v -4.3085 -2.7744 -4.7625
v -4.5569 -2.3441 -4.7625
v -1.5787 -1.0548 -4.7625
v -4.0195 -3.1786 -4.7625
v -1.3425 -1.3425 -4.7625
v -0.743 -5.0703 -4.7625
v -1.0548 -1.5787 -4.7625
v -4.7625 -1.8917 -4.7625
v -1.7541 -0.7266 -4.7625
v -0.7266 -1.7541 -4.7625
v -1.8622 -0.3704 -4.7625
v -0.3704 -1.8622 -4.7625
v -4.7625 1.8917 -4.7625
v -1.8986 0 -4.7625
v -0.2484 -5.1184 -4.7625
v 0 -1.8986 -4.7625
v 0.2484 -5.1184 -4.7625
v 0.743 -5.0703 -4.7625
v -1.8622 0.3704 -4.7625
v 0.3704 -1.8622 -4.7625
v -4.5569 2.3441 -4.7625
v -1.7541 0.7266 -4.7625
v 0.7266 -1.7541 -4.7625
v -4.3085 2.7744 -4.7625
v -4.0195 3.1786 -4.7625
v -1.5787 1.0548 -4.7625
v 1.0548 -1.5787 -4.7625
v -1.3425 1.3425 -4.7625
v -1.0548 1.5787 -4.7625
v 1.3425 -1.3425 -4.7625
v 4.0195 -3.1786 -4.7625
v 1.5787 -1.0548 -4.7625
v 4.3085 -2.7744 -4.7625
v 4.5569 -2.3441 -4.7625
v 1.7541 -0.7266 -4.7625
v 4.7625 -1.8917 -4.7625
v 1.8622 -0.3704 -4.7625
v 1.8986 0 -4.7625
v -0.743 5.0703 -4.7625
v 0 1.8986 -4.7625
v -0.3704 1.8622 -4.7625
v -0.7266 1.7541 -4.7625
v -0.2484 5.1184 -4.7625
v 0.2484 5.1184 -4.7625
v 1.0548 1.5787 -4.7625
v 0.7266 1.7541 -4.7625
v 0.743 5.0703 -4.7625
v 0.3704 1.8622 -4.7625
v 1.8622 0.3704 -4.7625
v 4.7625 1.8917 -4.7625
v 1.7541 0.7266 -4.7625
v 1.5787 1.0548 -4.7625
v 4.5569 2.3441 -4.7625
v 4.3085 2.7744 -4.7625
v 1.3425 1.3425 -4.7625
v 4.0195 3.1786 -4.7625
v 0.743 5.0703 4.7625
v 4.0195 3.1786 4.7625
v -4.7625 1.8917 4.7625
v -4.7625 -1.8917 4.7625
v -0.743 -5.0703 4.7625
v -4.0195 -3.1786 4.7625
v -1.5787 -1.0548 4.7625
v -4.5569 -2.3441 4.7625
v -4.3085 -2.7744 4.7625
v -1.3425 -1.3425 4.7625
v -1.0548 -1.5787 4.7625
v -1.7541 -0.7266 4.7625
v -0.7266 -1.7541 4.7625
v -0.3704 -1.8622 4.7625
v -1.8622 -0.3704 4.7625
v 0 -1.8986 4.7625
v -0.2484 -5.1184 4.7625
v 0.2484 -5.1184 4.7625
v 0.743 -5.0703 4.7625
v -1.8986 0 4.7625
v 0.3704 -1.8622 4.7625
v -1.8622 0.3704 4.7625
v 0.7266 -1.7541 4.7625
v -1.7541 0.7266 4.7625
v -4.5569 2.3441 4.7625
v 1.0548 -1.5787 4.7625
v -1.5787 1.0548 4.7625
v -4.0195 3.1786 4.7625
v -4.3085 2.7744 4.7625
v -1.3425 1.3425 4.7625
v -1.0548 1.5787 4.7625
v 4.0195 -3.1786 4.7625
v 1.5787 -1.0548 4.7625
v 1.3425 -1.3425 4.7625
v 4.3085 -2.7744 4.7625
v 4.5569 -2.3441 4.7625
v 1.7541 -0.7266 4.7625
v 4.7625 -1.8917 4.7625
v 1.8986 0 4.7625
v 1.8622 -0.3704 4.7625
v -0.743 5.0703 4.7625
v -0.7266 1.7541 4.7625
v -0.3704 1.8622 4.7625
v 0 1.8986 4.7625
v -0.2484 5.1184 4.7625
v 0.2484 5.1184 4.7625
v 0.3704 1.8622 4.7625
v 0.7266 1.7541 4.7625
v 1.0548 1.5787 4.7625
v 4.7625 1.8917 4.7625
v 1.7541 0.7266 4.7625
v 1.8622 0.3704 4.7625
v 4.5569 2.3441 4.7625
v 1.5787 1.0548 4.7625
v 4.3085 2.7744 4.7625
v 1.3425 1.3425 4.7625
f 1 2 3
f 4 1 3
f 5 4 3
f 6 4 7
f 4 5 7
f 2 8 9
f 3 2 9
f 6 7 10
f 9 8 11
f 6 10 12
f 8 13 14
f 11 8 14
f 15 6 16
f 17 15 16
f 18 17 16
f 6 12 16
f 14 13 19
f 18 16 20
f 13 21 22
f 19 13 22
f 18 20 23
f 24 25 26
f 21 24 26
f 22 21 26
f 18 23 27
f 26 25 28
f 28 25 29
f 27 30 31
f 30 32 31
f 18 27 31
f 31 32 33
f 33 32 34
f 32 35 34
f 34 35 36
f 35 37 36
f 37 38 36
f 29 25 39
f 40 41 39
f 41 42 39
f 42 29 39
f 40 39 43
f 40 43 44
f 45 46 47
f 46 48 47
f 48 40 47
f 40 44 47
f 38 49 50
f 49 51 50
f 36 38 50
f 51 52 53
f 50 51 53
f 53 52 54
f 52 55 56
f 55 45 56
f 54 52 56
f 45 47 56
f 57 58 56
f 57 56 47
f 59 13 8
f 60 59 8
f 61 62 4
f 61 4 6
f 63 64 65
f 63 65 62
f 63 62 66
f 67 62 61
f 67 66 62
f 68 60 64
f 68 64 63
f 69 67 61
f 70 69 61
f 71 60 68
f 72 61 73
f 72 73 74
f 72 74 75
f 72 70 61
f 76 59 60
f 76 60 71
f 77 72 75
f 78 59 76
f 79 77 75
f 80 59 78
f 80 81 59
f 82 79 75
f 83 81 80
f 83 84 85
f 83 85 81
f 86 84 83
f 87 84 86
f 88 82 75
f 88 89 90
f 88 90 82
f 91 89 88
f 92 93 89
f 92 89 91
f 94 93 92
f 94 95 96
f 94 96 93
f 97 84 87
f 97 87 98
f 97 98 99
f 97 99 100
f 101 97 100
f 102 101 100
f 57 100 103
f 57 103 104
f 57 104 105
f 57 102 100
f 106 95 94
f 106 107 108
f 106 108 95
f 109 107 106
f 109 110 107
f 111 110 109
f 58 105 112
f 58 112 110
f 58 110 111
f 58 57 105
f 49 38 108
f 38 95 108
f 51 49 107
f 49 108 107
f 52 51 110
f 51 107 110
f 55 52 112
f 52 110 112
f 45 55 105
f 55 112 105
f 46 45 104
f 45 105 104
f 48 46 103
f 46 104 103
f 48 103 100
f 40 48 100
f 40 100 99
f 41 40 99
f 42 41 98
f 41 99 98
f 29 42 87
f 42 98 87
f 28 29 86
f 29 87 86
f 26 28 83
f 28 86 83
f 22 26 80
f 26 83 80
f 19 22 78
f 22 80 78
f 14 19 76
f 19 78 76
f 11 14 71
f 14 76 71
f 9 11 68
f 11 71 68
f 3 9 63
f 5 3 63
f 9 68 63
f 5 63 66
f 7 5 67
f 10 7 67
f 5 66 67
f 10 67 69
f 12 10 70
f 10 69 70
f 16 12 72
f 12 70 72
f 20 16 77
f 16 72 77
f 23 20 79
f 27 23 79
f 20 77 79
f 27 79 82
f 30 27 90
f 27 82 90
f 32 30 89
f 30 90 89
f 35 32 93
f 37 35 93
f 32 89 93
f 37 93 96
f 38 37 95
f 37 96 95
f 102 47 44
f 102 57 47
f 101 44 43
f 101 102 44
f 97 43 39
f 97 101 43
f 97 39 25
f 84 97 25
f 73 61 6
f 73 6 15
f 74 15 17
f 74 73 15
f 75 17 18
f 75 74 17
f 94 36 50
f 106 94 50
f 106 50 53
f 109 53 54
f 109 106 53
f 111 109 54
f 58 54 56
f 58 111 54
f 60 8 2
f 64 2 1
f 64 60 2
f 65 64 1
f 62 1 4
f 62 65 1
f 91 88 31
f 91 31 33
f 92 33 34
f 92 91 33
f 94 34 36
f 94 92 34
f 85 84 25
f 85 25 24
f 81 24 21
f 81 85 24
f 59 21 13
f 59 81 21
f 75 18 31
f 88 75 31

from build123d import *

# Parameters (mm, degrees)
SKETCH1_R               = 4.7625
BASIC_ROD_DEPTH         = 4.7625
BASIC_ROD_DEPTH_BACK    = 4.7625
THEX_DEPTH              = 4.7625
SKETCH2_R               = 1.89865
INTERNAL_CUT_DEPTH      = 5.7625
INTERNAL_CUT_DEPTH_BACK = 5.7625


with BuildPart() as part:
    # Sketch1 → Basic Rod (new body, two sides)
    with BuildSketch(Plane.XY) as basic_rod_sk:
        Circle(SKETCH1_R)
    extrude(amount=BASIC_ROD_DEPTH)
    extrude(basic_rod_sk.sketch, amount=-BASIC_ROD_DEPTH_BACK)

    # Sketch8 → THex (add, symmetric)
    with BuildSketch(Plane.XY):
        with BuildLine():
            Line((-0.742977689, 5.070302945), (-4.019522311, 3.178589026))
            ThreePointArc((-4.019522311, 3.178589026), (-4.43790388, 2.562225), (-4.7625, 1.891713919))
            Line((-4.7625, 1.891713919), (-4.7625, -1.891713919))
            ThreePointArc((-4.7625, -1.891713919), (-4.43790388, -2.562225), (-4.019522311, -3.178589026))
            Line((-4.019522311, -3.178589026), (-0.742977689, -5.070302945))
            ThreePointArc((-0.742977689, -5.070302945), (0, -5.12445), (0.742977689, -5.070302945))
            Line((0.742977689, -5.070302945), (4.019522311, -3.178589026))
            ThreePointArc((4.019522311, -3.178589026), (4.43790388, -2.562225), (4.7625, -1.891713919))
            Line((4.7625, -1.891713919), (4.7625, 1.891713919))
            ThreePointArc((4.7625, 1.891713919), (4.43790388, 2.562225), (4.019522311, 3.178589026))
            Line((4.019522311, 3.178589026), (0.742977689, 5.070302945))
            ThreePointArc((0.742977689, 5.070302945), (0, 5.12445), (-0.742977689, 5.070302945))
        make_face()
    extrude(amount=THEX_DEPTH, both=True)

    # Sketch2 → Internal Cut (cut, two sides)
    with BuildSketch(Plane.XY) as internal_cut_sk:
        Circle(SKETCH2_R)
    extrude(amount=INTERNAL_CUT_DEPTH, mode=Mode.SUBTRACT)
    extrude(internal_cut_sk.sketch, amount=-INTERNAL_CUT_DEPTH_BACK, mode=Mode.SUBTRACT)


solid = part.part
